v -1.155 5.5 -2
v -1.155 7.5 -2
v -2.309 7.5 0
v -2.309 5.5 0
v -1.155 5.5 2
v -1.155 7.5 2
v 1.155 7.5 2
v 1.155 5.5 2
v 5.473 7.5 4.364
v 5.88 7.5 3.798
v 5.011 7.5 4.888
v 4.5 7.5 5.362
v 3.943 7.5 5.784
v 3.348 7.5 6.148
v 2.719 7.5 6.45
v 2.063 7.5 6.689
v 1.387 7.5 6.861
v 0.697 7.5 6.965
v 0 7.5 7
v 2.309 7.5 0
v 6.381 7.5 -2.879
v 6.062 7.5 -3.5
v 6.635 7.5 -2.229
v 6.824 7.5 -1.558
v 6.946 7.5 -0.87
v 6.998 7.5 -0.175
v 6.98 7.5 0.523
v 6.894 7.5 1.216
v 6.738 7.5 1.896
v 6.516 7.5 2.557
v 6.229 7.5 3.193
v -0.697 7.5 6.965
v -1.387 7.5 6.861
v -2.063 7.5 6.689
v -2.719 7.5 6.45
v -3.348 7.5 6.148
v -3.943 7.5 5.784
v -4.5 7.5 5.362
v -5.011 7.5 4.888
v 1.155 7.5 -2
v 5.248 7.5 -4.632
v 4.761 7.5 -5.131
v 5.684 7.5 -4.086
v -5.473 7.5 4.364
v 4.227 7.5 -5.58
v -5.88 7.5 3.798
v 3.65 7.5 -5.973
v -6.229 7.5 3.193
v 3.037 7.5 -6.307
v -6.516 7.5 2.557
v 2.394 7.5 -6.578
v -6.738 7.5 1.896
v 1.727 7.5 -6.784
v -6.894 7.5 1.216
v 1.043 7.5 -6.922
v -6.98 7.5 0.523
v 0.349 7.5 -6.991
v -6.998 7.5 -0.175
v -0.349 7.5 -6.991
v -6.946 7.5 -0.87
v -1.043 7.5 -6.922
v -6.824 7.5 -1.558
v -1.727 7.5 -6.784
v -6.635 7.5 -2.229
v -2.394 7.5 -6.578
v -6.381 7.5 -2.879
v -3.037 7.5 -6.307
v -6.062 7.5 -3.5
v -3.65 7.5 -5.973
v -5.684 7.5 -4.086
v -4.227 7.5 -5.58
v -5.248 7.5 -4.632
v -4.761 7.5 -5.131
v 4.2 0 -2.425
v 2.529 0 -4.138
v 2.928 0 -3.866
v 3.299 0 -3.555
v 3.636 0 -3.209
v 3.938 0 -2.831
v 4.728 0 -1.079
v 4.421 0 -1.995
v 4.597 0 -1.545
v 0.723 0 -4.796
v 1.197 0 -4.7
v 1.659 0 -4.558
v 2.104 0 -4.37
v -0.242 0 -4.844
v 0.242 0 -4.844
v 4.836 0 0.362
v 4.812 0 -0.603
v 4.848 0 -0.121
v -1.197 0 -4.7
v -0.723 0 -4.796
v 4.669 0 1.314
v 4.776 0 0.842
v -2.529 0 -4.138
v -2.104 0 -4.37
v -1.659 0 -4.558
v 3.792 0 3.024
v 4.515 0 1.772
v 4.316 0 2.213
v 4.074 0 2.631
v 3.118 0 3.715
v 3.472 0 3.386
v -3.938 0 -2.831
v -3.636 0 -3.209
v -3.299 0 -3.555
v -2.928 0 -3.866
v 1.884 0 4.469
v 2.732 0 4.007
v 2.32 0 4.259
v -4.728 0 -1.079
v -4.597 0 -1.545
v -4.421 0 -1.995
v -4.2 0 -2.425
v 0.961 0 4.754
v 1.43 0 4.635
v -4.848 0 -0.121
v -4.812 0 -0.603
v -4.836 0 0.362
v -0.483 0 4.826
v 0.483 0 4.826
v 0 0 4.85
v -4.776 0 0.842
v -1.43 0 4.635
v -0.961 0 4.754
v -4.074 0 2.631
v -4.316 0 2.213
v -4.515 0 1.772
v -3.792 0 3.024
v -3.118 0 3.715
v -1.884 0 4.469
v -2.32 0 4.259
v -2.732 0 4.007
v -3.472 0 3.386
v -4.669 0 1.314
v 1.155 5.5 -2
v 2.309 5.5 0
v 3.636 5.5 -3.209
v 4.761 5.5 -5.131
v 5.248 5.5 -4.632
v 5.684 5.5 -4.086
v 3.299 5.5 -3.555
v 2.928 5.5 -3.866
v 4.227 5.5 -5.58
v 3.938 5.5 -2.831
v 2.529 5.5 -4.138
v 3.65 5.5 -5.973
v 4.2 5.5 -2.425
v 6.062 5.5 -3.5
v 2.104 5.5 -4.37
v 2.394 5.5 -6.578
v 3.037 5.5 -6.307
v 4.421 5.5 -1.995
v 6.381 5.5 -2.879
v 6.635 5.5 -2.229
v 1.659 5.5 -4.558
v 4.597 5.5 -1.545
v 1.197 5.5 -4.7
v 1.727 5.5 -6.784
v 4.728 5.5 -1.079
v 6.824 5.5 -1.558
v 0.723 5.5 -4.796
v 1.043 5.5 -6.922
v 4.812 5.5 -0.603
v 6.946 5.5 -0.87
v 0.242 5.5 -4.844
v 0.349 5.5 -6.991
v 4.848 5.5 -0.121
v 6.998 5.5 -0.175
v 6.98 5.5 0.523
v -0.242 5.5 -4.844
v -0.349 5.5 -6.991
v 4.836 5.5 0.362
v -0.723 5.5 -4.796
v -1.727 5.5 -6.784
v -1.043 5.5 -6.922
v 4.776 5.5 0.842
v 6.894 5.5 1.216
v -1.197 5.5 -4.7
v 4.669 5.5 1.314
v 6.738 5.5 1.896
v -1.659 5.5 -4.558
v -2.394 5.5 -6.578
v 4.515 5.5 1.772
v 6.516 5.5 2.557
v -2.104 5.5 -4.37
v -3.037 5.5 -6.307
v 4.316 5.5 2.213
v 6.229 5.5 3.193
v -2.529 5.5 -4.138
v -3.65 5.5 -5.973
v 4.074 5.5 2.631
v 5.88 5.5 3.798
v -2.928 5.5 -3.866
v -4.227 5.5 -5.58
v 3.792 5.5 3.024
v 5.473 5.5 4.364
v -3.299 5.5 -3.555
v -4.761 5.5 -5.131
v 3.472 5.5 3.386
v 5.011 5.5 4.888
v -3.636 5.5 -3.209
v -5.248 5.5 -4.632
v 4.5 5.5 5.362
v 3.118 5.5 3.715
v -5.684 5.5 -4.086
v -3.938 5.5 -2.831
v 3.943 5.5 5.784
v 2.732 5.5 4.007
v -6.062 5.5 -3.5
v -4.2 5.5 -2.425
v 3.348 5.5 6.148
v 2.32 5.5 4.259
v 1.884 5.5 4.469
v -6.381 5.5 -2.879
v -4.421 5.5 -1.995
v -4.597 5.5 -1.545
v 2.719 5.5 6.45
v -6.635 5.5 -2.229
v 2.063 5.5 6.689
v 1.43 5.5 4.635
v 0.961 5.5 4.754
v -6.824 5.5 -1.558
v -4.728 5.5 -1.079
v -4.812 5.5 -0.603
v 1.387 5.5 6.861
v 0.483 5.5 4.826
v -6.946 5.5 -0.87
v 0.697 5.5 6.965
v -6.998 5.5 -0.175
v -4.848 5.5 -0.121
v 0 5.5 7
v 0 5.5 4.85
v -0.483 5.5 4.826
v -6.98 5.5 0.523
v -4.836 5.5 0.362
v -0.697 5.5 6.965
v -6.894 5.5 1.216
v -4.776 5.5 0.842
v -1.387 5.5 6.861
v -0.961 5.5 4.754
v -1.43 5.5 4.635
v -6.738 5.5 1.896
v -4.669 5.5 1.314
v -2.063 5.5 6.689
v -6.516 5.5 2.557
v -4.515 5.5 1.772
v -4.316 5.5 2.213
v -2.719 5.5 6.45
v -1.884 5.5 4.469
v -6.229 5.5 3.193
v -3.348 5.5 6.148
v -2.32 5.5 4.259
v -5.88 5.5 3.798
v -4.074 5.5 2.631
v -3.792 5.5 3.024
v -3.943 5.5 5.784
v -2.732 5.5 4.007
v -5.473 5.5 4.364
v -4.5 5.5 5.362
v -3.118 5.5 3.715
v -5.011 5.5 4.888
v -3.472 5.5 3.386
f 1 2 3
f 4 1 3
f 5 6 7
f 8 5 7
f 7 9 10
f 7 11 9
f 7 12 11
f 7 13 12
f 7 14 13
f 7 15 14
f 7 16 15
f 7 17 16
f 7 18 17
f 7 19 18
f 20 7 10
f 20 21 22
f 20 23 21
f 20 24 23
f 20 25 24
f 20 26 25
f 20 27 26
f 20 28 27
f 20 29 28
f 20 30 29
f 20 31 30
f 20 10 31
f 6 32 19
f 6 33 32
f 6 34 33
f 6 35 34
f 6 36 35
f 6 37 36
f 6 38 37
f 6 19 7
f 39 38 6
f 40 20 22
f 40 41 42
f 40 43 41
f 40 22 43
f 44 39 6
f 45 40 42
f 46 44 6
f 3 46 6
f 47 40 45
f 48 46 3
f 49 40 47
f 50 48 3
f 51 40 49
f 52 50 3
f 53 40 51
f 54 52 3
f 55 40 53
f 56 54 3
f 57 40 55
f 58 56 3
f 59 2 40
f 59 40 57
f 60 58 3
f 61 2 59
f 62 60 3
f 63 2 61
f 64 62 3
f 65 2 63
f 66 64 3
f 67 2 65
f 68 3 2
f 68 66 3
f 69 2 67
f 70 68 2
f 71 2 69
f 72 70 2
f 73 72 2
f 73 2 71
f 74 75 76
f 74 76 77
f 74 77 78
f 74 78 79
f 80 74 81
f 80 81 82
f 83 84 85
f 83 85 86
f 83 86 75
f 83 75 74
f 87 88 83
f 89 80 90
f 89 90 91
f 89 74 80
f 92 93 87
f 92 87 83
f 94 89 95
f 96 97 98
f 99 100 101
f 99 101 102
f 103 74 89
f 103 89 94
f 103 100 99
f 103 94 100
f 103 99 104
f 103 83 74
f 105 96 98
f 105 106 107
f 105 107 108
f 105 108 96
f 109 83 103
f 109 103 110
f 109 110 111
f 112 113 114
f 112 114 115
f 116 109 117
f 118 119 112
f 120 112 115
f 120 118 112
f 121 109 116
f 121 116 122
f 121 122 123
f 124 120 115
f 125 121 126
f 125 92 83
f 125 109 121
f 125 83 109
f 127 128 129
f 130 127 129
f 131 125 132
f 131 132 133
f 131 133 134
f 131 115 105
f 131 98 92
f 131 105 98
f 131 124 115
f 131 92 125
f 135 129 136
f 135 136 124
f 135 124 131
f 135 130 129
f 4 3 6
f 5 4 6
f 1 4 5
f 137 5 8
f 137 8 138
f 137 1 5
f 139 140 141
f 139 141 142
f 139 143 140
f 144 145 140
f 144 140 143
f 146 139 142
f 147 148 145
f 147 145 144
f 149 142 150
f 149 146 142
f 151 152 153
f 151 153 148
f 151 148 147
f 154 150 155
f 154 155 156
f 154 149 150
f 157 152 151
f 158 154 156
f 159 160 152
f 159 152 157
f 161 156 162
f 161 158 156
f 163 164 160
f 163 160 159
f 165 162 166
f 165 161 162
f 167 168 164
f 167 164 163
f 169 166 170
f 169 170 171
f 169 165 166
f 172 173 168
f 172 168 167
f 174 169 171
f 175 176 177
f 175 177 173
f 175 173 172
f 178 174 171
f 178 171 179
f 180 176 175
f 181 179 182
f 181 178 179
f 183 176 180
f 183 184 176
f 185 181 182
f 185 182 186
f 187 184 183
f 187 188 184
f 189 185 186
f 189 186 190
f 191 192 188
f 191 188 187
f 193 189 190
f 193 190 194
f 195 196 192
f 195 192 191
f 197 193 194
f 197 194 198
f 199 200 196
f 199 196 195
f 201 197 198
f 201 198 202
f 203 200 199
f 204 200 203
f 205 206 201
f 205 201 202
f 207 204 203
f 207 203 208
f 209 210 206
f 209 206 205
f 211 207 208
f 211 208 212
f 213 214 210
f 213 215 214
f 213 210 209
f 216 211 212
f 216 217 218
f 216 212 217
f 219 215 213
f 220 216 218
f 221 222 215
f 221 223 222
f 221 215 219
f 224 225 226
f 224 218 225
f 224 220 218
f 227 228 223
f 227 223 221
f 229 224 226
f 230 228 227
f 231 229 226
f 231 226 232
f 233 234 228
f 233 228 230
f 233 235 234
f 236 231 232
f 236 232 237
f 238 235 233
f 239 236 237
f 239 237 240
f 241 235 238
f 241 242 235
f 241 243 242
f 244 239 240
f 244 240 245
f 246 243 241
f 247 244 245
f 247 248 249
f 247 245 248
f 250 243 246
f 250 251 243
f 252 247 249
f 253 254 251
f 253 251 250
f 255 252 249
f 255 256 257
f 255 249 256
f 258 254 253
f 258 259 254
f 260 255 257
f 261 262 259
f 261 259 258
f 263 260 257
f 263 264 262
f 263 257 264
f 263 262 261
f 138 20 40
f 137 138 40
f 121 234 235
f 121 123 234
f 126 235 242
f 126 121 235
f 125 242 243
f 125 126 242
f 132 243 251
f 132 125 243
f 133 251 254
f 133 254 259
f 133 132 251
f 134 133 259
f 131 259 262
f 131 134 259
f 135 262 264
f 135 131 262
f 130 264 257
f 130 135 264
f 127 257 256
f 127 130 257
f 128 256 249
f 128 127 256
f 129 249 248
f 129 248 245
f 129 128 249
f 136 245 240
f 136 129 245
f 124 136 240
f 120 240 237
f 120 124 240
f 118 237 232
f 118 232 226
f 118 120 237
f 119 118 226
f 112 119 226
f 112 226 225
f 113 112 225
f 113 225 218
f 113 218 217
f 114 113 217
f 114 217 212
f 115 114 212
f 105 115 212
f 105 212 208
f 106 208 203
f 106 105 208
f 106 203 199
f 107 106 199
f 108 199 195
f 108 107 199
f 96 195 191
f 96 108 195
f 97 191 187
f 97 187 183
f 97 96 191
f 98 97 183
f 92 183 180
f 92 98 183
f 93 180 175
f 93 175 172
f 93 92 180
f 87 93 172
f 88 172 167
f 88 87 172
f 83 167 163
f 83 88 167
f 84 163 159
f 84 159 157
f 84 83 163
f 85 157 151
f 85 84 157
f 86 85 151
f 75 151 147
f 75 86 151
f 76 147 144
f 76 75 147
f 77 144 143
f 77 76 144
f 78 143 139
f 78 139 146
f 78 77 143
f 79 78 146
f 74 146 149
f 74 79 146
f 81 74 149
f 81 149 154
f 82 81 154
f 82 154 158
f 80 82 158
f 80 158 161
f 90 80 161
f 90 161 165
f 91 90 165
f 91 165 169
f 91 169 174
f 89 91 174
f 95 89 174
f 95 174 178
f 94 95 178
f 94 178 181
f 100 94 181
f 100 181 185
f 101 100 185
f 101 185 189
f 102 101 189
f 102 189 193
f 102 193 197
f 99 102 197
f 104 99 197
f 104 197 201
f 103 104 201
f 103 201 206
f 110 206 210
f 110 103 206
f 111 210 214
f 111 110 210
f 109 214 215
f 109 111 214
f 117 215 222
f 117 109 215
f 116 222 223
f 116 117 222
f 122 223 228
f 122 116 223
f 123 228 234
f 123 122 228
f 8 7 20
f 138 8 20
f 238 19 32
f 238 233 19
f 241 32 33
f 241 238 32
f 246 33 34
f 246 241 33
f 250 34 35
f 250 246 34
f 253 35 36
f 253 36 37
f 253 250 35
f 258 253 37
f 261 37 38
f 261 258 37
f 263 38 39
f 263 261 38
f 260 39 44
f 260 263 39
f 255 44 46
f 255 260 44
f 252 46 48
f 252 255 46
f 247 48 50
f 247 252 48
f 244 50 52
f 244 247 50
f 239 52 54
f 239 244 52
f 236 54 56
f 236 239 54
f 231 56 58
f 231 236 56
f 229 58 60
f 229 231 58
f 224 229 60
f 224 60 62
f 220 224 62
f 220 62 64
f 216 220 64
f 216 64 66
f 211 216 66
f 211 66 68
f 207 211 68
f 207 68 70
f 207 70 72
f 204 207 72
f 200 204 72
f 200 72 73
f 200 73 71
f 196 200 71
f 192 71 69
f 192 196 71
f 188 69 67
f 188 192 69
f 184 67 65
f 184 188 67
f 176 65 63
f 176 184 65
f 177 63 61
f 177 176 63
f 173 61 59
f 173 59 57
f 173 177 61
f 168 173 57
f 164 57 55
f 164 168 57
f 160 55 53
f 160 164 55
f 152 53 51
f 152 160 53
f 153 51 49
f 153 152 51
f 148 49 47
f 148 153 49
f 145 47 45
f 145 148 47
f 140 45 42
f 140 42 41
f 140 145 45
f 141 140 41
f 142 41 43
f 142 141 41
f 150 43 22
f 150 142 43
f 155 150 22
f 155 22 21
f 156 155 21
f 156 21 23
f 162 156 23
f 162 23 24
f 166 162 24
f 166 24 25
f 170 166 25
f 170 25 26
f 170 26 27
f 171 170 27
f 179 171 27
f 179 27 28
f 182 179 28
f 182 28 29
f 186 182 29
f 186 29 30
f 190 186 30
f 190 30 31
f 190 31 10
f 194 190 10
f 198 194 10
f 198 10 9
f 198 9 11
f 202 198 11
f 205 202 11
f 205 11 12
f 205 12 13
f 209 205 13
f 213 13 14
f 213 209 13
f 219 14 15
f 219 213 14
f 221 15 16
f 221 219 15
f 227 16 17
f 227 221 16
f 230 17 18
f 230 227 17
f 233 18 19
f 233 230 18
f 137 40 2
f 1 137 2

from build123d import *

# Parameters (mm, degrees)
CUT_EXTRUDE_1_DEPTH = 2


with BuildPart() as part:
    # Эскиз1 → Повернуть1 (revolve)
    with BuildSketch(Plane.XY, mode=Mode.PRIVATE) as revolve_1_sk:
        Polygon((0, 7.5), (7, 7.5), (7, 5.5), (4.85, 5.5), (4.85, 0), (0, 0), align=None)
    revolve(revolve_1_sk.sketch.rotate(Axis((0, 21.439331355, 0), (0, -1, 0)), 90), axis=Axis((0, 21.439331355, 0), (0, -1, 0)))

    # Эскиз2 → Вырез-Вытянуть1 (cut)
    with BuildSketch(Plane(origin=(0, 7.5, 0), x_dir=(1, 0, 0), z_dir=(0, 1, 0))):
        Polygon((2.309401077, 0), (1.154700538, 2), (-1.154700538, 2), (-2.309401077, 0), (-1.154700538, -2), (1.154700538, -2), align=None)
    extrude(amount=-CUT_EXTRUDE_1_DEPTH, mode=Mode.SUBTRACT)


solid = part.part
